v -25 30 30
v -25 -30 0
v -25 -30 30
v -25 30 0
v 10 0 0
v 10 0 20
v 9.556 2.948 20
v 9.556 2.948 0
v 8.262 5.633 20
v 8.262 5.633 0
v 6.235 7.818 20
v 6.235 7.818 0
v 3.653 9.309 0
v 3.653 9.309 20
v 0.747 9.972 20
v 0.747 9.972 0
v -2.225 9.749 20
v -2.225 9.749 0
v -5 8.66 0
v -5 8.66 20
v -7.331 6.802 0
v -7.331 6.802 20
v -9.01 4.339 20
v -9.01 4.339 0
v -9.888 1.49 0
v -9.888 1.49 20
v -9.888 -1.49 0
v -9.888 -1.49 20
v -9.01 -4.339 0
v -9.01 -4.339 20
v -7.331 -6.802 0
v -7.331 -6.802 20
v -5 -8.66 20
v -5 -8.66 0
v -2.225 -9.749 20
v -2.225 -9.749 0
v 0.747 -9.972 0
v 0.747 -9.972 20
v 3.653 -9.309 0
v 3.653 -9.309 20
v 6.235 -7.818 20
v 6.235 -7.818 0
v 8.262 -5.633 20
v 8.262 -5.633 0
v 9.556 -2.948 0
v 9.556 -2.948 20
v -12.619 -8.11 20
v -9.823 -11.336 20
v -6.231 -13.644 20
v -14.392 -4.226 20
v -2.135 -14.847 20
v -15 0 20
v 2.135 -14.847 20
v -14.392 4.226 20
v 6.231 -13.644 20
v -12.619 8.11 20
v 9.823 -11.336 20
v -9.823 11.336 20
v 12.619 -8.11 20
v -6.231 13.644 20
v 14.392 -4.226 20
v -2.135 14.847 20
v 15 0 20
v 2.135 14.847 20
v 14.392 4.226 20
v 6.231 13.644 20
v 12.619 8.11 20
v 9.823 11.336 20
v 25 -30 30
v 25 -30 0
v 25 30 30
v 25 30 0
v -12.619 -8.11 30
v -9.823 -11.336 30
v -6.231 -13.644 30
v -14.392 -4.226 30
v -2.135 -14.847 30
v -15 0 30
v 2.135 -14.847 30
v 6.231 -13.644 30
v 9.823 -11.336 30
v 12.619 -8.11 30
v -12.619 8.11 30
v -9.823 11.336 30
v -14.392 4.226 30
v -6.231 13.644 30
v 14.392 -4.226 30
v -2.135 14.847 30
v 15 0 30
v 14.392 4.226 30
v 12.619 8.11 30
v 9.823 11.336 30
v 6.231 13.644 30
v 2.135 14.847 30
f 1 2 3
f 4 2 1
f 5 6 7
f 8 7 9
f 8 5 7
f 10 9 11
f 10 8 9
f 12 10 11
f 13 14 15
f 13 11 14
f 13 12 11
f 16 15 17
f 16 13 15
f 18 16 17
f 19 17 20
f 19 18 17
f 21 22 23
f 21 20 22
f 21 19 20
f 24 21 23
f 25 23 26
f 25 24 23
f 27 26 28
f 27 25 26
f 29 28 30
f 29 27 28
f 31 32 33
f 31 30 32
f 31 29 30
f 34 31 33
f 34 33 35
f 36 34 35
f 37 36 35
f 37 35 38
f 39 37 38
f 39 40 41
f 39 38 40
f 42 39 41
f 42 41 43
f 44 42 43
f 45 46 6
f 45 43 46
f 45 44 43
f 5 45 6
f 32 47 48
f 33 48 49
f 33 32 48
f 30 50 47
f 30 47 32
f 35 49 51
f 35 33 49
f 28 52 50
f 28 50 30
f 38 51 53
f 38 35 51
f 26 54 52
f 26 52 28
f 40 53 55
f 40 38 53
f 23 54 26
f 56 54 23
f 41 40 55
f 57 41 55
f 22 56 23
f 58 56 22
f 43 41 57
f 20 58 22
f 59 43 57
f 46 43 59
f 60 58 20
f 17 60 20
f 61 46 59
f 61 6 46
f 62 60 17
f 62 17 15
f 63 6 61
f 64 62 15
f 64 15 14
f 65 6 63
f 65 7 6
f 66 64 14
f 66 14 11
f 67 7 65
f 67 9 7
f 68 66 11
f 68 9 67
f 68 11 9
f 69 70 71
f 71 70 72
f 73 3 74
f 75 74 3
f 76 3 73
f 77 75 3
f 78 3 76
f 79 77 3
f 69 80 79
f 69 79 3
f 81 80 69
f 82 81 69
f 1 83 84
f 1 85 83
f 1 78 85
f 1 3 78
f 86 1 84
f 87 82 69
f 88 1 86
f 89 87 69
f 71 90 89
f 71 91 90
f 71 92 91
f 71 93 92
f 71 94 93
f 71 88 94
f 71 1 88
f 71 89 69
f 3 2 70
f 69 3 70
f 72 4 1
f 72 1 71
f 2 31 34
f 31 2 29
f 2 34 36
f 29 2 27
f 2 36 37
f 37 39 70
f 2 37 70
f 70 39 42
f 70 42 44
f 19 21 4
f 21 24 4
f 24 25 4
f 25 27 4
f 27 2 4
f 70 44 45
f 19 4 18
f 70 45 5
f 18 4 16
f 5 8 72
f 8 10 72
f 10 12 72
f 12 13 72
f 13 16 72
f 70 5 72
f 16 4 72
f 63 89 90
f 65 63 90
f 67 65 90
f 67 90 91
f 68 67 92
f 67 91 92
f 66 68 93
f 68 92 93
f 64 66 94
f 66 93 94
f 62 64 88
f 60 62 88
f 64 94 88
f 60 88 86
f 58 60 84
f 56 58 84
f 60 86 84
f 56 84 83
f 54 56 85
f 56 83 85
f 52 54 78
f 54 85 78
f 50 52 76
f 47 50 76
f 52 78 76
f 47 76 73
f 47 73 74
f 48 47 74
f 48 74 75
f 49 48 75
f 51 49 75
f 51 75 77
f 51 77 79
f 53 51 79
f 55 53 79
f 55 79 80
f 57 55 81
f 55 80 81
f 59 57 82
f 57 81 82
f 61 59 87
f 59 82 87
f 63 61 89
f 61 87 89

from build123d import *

# Parameters (mm, degrees)
ESQUISSE1_W             = 50
ESQUISSE1_H             = 60
ESQUISSE1_R             = 10
BOSS_EXTRU_1_DEPTH      = 30
ESQUISSE2_R             = 15
ENL_V_MAT_EXTRU_1_DEPTH = 10


with BuildPart() as part:
    # Esquisse1 → Boss.-Extru.1 (new body)
    with BuildSketch(Plane.XY):
        Rectangle(ESQUISSE1_W, ESQUISSE1_H)
        Circle(ESQUISSE1_R, mode=Mode.SUBTRACT)
    extrude(amount=BOSS_EXTRU_1_DEPTH)

    # Esquisse2 → Enlèv. mat.-Extru.1 (cut)
    with BuildSketch(Plane.XY.offset(30)):
        Circle(ESQUISSE2_R)
    extrude(amount=-ENL_V_MAT_EXTRU_1_DEPTH, mode=Mode.SUBTRACT)


solid = part.part
